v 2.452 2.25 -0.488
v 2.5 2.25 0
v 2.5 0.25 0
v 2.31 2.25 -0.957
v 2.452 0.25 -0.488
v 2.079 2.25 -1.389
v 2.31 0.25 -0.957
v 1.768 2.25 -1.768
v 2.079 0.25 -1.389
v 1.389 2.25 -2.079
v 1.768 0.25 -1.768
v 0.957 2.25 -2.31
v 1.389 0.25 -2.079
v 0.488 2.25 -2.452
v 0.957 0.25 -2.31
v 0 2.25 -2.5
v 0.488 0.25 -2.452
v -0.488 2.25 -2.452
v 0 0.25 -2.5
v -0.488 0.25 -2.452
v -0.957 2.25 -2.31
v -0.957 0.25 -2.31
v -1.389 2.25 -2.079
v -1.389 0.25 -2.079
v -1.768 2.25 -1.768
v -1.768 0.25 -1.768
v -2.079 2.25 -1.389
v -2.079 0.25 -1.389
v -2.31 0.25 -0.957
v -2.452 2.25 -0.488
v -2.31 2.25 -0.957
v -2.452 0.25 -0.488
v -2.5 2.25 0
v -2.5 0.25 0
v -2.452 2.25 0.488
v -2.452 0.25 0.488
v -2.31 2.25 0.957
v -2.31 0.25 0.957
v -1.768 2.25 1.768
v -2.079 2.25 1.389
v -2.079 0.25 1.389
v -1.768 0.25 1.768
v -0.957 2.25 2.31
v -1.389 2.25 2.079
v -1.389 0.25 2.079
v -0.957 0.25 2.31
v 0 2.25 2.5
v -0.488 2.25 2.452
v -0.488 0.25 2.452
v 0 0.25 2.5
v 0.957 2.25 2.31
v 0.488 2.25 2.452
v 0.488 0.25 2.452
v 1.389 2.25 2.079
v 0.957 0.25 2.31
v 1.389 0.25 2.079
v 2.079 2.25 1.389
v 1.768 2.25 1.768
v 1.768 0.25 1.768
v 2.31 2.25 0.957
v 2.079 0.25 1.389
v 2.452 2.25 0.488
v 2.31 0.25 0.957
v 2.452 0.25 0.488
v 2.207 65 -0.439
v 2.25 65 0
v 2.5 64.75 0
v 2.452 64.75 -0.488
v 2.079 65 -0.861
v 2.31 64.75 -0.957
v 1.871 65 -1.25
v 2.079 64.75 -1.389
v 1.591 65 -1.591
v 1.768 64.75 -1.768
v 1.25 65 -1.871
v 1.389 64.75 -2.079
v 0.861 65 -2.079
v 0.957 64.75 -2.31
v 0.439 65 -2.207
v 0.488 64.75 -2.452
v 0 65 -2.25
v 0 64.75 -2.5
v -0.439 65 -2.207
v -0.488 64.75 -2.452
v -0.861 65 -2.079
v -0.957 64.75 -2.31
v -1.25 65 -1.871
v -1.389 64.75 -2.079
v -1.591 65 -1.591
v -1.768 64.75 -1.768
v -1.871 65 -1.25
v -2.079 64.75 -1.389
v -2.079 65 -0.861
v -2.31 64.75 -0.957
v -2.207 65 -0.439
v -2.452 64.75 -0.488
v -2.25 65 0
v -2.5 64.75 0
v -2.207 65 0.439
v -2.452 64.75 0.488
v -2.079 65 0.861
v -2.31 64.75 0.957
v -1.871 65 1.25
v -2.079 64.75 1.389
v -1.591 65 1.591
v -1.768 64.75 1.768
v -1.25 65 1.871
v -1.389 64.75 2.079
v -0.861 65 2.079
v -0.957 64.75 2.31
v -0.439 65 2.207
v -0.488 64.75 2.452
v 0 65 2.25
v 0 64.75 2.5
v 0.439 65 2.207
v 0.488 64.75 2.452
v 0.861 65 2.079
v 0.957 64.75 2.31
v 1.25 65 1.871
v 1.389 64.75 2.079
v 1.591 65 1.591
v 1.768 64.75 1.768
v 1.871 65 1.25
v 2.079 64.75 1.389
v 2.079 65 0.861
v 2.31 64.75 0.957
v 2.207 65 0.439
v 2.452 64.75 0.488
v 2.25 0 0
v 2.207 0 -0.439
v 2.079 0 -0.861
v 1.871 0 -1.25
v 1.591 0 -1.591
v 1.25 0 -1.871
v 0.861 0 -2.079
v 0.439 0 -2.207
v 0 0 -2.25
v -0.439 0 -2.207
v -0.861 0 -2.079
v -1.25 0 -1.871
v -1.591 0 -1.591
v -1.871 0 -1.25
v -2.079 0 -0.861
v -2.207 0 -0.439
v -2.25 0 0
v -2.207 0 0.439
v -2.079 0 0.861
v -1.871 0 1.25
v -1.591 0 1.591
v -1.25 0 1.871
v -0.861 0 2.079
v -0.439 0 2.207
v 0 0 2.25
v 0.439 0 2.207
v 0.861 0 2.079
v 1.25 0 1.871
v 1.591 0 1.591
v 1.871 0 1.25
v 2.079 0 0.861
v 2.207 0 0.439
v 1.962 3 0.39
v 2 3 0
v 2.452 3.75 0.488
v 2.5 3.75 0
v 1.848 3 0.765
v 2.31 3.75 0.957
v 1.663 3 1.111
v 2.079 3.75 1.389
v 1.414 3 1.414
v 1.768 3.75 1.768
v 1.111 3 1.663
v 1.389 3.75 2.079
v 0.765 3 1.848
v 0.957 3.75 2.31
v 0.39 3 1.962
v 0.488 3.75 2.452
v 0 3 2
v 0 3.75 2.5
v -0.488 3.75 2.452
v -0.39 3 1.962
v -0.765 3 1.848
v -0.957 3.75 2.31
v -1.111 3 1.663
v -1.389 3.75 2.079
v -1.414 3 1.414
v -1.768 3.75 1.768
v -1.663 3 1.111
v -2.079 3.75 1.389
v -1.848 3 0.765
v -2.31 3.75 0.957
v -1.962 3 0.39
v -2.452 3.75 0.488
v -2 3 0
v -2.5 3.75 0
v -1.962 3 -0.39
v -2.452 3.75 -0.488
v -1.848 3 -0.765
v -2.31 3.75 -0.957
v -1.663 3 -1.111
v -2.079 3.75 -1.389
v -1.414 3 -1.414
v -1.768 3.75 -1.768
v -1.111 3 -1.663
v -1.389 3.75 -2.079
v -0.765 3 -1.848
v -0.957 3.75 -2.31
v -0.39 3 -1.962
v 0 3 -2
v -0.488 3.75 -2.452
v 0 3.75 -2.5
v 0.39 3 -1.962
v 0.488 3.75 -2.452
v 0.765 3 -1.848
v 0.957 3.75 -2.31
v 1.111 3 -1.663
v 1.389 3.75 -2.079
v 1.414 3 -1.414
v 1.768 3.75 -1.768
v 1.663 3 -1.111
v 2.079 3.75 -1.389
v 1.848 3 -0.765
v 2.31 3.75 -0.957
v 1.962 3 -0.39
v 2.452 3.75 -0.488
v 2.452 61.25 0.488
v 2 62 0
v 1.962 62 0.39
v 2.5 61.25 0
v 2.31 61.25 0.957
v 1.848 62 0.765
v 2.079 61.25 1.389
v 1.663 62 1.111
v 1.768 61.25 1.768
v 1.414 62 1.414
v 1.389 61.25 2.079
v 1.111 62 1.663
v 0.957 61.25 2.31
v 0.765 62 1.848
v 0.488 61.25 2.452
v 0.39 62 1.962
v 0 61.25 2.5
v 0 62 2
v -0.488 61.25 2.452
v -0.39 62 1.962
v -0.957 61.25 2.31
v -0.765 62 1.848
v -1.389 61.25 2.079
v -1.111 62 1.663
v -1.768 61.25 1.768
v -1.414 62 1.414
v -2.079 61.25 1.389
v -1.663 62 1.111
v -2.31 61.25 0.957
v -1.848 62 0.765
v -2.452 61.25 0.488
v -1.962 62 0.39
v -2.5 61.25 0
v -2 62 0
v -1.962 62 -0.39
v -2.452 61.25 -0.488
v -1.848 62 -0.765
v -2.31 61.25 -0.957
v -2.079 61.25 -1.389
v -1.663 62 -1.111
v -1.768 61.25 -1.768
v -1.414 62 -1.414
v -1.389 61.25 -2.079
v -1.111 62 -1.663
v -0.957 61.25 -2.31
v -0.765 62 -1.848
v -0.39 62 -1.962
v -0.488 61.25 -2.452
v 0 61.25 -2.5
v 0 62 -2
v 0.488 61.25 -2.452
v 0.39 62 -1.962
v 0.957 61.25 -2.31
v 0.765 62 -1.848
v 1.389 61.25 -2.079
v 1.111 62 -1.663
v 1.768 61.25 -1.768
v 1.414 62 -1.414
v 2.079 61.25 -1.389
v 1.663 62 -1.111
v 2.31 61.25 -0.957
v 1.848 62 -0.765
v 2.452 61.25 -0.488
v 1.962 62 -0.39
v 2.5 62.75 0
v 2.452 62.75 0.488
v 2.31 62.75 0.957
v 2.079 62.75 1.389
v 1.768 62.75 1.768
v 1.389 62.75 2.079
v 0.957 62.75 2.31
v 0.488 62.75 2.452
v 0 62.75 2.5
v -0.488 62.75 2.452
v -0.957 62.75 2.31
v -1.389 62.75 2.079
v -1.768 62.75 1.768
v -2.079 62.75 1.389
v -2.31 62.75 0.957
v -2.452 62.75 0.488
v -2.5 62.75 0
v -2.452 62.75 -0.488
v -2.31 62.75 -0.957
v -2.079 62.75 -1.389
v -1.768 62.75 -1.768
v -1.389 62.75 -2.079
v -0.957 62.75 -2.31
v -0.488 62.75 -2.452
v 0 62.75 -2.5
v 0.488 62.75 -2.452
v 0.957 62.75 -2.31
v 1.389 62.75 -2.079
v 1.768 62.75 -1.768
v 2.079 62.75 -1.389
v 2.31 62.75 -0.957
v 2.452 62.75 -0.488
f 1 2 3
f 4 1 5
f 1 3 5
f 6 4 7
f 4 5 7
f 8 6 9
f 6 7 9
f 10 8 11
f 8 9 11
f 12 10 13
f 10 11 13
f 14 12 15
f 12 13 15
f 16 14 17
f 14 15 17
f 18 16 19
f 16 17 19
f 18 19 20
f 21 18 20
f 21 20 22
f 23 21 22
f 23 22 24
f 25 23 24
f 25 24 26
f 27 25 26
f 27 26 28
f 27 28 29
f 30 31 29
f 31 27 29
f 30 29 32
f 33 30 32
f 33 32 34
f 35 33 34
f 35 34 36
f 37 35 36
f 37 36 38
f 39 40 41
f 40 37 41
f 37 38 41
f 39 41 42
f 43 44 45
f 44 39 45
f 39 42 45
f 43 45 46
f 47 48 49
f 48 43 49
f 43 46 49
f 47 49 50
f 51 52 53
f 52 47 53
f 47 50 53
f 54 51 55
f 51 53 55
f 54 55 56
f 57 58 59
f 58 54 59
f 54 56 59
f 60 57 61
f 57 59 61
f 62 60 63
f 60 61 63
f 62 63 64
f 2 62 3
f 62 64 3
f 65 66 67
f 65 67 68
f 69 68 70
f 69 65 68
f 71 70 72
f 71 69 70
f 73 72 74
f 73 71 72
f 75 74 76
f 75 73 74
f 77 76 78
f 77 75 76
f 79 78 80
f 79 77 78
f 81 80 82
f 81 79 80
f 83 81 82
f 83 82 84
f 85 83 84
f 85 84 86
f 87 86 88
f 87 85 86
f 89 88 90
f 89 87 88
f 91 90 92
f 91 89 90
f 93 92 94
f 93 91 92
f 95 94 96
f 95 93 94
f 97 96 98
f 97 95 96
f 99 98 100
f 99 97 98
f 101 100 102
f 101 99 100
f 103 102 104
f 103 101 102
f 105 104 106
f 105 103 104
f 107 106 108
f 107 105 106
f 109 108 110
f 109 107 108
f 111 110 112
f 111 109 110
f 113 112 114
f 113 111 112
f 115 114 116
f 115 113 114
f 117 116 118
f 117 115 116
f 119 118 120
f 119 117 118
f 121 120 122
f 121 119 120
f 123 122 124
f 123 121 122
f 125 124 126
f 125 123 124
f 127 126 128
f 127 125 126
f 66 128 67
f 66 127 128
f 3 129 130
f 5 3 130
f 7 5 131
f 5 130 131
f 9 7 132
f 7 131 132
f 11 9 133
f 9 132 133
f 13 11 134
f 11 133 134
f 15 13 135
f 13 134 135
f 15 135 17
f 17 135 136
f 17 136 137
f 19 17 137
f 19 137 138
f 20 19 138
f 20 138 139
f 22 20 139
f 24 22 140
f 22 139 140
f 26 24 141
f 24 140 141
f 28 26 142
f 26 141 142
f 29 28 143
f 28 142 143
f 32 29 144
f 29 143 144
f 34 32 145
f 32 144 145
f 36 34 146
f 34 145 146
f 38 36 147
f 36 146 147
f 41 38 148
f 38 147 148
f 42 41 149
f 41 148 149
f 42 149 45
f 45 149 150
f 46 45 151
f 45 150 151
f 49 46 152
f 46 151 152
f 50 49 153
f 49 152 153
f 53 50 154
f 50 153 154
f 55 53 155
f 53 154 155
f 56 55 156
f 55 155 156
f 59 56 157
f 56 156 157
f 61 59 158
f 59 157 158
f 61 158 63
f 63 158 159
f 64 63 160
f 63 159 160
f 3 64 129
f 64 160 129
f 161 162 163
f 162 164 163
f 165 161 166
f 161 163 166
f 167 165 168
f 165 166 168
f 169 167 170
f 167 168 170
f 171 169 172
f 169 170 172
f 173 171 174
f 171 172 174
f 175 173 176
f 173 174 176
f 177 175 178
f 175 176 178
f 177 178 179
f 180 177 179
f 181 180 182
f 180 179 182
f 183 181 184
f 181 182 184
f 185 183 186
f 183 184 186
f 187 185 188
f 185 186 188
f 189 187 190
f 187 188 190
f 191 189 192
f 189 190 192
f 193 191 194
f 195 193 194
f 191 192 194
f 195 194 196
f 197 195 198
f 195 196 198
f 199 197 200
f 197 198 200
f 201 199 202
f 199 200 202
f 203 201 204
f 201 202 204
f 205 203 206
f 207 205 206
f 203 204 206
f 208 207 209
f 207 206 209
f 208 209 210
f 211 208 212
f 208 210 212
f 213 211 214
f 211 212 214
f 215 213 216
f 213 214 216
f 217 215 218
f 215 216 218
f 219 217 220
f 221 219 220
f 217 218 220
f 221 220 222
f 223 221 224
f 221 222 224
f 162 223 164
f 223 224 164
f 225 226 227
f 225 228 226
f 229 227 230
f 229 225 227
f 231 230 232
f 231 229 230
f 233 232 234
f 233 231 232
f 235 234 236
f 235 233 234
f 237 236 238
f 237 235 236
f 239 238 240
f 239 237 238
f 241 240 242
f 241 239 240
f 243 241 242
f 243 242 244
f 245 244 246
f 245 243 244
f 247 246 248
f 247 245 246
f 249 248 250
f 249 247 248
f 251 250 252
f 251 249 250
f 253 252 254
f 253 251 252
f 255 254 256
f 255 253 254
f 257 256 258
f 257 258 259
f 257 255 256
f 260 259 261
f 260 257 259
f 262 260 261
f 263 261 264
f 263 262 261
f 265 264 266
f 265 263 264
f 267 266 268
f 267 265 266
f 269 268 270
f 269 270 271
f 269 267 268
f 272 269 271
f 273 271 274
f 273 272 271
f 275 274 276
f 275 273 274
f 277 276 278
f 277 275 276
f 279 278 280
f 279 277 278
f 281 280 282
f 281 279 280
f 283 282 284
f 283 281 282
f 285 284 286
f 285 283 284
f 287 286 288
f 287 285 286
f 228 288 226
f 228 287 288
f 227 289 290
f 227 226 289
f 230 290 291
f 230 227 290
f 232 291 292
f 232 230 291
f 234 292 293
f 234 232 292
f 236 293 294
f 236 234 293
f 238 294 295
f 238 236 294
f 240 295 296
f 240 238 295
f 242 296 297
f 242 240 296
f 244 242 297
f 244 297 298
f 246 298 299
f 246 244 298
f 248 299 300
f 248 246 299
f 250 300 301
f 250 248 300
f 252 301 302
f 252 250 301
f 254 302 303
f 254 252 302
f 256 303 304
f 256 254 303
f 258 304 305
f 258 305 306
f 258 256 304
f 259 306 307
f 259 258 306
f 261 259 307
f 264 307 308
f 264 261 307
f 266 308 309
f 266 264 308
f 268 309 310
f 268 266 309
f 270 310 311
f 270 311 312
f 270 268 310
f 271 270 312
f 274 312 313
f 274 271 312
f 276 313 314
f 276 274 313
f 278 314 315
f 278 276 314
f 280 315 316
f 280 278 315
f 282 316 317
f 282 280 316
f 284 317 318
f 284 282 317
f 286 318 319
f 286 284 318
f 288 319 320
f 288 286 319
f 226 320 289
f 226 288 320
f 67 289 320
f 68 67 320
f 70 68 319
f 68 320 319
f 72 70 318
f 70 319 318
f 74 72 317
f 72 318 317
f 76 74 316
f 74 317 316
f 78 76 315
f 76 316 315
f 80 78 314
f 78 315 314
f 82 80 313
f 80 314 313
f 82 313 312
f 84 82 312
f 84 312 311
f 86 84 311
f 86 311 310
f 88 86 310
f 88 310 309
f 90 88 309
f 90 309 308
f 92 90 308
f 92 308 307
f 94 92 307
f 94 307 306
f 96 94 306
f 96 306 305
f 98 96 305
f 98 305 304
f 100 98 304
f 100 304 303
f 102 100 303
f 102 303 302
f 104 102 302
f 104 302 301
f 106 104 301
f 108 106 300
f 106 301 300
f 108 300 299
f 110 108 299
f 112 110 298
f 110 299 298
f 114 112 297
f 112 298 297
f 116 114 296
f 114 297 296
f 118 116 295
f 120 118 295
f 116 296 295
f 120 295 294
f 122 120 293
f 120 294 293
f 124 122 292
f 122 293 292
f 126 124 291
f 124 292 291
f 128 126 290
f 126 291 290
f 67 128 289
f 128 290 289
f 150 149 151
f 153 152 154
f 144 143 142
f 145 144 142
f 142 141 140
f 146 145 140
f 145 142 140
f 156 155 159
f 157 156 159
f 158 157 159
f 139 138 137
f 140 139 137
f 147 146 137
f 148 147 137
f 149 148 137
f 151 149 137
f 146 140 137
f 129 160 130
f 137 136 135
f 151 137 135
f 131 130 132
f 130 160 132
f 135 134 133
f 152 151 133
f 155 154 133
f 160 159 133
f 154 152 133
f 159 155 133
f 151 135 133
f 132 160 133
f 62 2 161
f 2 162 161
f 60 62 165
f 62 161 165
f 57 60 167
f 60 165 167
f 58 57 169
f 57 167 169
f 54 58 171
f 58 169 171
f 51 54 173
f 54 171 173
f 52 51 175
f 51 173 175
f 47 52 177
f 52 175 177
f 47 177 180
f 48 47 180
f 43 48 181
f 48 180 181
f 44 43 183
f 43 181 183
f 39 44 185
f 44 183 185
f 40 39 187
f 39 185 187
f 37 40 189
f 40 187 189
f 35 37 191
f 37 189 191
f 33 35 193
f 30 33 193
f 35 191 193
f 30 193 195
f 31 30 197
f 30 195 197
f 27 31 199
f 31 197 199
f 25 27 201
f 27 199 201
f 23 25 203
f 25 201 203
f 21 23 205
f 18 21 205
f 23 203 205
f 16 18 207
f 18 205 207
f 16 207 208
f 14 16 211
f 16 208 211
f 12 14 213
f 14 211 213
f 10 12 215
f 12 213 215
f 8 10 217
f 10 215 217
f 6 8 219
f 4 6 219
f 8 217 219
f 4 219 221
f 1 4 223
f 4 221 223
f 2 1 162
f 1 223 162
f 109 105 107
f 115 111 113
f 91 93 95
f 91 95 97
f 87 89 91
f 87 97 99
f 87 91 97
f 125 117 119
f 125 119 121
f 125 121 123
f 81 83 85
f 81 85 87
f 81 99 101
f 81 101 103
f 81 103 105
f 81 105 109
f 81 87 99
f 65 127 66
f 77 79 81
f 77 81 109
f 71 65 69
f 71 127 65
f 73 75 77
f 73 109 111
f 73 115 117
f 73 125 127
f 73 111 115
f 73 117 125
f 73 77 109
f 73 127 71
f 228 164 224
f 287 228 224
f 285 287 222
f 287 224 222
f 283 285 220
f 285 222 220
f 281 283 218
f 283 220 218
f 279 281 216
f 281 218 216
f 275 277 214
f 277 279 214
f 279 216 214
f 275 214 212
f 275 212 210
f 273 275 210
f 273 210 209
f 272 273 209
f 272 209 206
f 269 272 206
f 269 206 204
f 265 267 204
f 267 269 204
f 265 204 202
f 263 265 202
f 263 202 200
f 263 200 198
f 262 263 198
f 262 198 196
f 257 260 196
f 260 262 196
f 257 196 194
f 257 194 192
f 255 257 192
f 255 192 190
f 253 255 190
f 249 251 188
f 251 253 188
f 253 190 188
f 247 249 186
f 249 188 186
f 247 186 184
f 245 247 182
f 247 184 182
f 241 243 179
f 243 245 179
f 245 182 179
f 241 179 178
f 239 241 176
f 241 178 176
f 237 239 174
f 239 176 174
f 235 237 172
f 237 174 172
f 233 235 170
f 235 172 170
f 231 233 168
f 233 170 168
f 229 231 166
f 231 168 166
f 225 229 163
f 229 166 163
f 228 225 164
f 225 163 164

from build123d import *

# Parameters (mm, degrees)
ESQUISSE1_R        = 2.5
BOSS_EXTRU_1_DEPTH = 65
CHANFREIN1_SIZE    = 0.25


with BuildPart() as part:
    # Esquisse1 → Boss.-Extru.1 (new body)
    with BuildSketch(Plane(origin=(0, 0, 0), x_dir=(1, 0, 0), z_dir=(0, 1, 0))):
        Circle(ESQUISSE1_R)
    extrude(amount=BOSS_EXTRU_1_DEPTH)

    # Chanfrein1
    chanfrein1_edges = [part.edges().sort_by_distance(p)[0] for p in [
        (-2.5, 0, 0),
        (-2.5, 65, 0),
    ]]
    chamfer(chanfrein1_edges, length=CHANFREIN1_SIZE)

    # Esquisse2 → Enlèvement de matière-Révolution1 (revolve, cut)
    with BuildSketch(Plane.XY):
        Polygon((2.5, 62.75), (2, 62), (2.5, 61.25), align=None)
        Polygon((2, 3), (2.5, 3.75), (2.5, 2.25), align=None)
    revolve(axis=Axis((0, 64.75, 0), (0, -1, 0)), mode=Mode.SUBTRACT)


solid = part.part
